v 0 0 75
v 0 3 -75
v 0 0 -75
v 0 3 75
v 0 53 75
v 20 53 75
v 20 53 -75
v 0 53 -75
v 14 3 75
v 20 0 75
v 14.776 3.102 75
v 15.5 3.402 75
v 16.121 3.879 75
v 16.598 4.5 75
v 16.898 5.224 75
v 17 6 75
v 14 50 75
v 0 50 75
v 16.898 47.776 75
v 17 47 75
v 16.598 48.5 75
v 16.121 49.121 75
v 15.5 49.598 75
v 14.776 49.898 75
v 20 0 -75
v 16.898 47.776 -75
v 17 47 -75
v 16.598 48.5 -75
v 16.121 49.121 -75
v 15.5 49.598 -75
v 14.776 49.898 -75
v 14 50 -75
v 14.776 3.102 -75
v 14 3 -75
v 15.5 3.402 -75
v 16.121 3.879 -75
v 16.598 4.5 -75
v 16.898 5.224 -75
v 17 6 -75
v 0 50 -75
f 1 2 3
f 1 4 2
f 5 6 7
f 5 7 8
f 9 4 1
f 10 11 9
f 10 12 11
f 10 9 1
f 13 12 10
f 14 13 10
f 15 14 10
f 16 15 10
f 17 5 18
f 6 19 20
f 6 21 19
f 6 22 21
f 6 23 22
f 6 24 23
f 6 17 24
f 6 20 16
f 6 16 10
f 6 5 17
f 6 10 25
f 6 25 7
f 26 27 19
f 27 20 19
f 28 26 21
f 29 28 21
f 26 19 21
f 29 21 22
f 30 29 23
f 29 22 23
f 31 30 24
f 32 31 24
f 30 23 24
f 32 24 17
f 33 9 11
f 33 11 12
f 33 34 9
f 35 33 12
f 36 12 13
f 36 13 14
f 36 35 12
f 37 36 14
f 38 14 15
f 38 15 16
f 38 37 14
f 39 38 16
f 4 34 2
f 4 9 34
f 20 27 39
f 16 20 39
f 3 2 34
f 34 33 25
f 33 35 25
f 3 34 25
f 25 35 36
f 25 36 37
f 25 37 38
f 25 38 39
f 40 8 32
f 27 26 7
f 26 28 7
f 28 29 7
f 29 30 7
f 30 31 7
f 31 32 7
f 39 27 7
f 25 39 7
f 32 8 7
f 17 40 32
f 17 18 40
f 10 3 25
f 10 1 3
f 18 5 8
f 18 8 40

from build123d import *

# Parameters (mm, degrees)
EXTRUDE_1_DEPTH = 75
FILLET_1_R      = 3


with BuildPart() as part:
    # Эскиз1 → Вытянуть-Тонкостенный1 (new, symmetric)
    with BuildSketch(Plane.XY):
        Polygon((0, 0), (20, 0), (20, 53), (0, 53), (0, 50), (17, 50), (17, 3), (0, 3), align=None)
    extrude(amount=EXTRUDE_1_DEPTH, both=True)

    # Скругление1
    fillet_1_edges = [part.edges().sort_by_distance(p)[0] for p in [
        (17, 3, 0),
        (17, 50, 0),
    ]]
    fillet(fillet_1_edges, radius=FILLET_1_R)


solid = part.part
